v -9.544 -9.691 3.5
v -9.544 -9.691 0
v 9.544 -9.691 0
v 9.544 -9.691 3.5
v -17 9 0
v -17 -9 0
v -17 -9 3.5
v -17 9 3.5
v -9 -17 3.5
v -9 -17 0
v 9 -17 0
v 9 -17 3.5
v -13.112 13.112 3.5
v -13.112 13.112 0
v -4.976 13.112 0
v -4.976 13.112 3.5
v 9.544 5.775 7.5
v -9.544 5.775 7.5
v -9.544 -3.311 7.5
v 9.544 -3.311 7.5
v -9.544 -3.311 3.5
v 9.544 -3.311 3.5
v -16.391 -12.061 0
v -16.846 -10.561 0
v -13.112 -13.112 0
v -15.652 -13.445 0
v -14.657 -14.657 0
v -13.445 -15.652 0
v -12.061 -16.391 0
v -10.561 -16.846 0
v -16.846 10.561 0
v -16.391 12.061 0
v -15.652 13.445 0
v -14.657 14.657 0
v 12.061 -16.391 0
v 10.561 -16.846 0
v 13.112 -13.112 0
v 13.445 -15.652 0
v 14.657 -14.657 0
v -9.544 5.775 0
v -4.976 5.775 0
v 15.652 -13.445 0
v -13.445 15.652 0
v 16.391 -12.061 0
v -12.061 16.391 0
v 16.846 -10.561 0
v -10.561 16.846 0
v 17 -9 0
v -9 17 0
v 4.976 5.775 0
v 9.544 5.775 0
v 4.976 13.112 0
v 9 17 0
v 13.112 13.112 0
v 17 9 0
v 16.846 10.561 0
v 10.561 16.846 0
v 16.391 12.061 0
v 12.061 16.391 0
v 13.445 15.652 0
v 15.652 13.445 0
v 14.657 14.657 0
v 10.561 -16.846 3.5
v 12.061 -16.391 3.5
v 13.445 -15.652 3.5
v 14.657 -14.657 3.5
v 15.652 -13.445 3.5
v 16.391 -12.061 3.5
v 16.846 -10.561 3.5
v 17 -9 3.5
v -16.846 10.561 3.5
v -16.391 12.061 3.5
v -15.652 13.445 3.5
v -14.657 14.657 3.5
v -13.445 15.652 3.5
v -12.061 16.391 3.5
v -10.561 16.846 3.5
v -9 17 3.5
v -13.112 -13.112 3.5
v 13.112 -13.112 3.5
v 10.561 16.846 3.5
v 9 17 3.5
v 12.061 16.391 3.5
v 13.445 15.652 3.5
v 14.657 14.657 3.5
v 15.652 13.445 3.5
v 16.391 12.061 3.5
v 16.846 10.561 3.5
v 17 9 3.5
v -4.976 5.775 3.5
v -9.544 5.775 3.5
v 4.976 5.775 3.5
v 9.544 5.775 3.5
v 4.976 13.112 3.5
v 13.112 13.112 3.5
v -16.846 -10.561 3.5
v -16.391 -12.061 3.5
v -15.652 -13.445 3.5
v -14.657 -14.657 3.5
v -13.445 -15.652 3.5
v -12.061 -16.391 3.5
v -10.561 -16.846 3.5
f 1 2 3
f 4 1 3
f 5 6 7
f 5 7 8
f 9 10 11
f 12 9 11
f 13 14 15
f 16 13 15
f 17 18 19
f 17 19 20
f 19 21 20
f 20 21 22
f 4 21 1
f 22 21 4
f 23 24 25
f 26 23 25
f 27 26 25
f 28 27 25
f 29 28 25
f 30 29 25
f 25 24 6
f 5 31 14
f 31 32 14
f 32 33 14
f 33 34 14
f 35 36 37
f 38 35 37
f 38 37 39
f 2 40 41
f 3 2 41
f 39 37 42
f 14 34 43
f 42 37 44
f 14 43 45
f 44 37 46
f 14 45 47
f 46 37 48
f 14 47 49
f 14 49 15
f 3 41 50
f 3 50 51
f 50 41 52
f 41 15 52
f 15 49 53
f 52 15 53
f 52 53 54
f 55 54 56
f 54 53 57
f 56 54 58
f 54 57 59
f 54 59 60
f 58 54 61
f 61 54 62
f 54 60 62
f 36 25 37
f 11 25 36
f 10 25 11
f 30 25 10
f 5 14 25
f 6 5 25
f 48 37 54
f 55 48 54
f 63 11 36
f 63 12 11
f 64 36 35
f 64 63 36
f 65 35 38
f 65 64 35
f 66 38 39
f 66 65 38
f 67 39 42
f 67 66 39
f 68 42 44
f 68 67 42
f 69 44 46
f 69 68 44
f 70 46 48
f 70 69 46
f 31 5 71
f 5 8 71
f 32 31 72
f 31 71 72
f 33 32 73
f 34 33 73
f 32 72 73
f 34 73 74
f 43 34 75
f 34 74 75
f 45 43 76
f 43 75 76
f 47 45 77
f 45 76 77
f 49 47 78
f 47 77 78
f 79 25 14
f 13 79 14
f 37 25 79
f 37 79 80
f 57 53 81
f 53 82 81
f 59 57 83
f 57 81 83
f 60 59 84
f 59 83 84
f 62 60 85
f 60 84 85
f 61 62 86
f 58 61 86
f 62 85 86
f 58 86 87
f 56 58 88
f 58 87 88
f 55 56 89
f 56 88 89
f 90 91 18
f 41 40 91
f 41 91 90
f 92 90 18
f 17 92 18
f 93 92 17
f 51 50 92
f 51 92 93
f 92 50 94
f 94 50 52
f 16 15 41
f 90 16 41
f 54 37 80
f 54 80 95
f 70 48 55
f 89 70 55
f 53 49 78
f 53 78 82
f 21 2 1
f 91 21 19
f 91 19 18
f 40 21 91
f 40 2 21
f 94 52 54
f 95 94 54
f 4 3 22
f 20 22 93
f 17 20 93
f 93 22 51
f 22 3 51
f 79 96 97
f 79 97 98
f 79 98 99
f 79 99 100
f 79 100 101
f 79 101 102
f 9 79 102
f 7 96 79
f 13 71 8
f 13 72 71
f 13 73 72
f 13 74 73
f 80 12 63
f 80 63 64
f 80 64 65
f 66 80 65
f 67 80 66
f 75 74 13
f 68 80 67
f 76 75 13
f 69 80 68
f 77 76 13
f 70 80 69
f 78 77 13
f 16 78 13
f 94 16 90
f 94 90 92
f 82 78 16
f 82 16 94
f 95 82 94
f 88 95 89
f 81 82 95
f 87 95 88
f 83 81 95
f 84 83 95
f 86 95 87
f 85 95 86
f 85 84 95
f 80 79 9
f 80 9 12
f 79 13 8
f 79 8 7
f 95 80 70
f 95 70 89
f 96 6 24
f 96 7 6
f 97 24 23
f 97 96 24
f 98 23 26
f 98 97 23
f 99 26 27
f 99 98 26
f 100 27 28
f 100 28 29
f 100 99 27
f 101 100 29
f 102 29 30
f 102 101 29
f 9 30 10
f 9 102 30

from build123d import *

# Parameters (mm, degrees)
SKETCH2_W           = 34
SKETCH2_H           = 34
SKETCH2_W_2         = 26.224899522
SKETCH2_H_2         = 26.224899522
BOSS_EXTRUDE1_DEPTH = 3.5
SKETCH4_W           = 19.088264776
SKETCH4_H           = 9.085831195
BOSS_EXTRUDE2_DEPTH = 4
FILLET1_R           = 8


with BuildPart() as part:
    # Sketch2 → Boss-Extrude1 (new body)
    # profile 1 of 2: a face of its own
    with BuildSketch(Plane.XY):
        Rectangle(SKETCH2_W, SKETCH2_H)
        Rectangle(SKETCH2_W_2, SKETCH2_H_2, mode=Mode.SUBTRACT)
    # profile 2 of 2: a face of its own
    with BuildSketch(Plane.XY):
        Polygon((4.976248984, 13.112449761), (-4.976248984, 13.112449761), (-4.976248984, 5.775025294), (-9.544132388, 5.775025294), (-9.544132388, -9.69135518), (9.544132388, -9.69135518), (9.544132388, 5.775025294), (4.976248984, 5.775025294), align=None)
    extrude(amount=BOSS_EXTRUDE1_DEPTH)

    # Sketch4 → Boss-Extrude2 (add)
    with BuildSketch(Plane.XY.offset(3.5)):
        with Locations((0, 1.232109697)):
            Rectangle(SKETCH4_W, SKETCH4_H)
    extrude(amount=BOSS_EXTRUDE2_DEPTH)

    # Fillet1
    fillet1_edges = [part.edges().sort_by_distance(p)[0] for p in [
        (-17, 17, 1.75),
        (17, 17, 1.75),
        (17, -17, 1.75),
        (-17, -17, 1.75),
    ]]
    fillet(fillet1_edges, radius=FILLET1_R)


solid = part.part
